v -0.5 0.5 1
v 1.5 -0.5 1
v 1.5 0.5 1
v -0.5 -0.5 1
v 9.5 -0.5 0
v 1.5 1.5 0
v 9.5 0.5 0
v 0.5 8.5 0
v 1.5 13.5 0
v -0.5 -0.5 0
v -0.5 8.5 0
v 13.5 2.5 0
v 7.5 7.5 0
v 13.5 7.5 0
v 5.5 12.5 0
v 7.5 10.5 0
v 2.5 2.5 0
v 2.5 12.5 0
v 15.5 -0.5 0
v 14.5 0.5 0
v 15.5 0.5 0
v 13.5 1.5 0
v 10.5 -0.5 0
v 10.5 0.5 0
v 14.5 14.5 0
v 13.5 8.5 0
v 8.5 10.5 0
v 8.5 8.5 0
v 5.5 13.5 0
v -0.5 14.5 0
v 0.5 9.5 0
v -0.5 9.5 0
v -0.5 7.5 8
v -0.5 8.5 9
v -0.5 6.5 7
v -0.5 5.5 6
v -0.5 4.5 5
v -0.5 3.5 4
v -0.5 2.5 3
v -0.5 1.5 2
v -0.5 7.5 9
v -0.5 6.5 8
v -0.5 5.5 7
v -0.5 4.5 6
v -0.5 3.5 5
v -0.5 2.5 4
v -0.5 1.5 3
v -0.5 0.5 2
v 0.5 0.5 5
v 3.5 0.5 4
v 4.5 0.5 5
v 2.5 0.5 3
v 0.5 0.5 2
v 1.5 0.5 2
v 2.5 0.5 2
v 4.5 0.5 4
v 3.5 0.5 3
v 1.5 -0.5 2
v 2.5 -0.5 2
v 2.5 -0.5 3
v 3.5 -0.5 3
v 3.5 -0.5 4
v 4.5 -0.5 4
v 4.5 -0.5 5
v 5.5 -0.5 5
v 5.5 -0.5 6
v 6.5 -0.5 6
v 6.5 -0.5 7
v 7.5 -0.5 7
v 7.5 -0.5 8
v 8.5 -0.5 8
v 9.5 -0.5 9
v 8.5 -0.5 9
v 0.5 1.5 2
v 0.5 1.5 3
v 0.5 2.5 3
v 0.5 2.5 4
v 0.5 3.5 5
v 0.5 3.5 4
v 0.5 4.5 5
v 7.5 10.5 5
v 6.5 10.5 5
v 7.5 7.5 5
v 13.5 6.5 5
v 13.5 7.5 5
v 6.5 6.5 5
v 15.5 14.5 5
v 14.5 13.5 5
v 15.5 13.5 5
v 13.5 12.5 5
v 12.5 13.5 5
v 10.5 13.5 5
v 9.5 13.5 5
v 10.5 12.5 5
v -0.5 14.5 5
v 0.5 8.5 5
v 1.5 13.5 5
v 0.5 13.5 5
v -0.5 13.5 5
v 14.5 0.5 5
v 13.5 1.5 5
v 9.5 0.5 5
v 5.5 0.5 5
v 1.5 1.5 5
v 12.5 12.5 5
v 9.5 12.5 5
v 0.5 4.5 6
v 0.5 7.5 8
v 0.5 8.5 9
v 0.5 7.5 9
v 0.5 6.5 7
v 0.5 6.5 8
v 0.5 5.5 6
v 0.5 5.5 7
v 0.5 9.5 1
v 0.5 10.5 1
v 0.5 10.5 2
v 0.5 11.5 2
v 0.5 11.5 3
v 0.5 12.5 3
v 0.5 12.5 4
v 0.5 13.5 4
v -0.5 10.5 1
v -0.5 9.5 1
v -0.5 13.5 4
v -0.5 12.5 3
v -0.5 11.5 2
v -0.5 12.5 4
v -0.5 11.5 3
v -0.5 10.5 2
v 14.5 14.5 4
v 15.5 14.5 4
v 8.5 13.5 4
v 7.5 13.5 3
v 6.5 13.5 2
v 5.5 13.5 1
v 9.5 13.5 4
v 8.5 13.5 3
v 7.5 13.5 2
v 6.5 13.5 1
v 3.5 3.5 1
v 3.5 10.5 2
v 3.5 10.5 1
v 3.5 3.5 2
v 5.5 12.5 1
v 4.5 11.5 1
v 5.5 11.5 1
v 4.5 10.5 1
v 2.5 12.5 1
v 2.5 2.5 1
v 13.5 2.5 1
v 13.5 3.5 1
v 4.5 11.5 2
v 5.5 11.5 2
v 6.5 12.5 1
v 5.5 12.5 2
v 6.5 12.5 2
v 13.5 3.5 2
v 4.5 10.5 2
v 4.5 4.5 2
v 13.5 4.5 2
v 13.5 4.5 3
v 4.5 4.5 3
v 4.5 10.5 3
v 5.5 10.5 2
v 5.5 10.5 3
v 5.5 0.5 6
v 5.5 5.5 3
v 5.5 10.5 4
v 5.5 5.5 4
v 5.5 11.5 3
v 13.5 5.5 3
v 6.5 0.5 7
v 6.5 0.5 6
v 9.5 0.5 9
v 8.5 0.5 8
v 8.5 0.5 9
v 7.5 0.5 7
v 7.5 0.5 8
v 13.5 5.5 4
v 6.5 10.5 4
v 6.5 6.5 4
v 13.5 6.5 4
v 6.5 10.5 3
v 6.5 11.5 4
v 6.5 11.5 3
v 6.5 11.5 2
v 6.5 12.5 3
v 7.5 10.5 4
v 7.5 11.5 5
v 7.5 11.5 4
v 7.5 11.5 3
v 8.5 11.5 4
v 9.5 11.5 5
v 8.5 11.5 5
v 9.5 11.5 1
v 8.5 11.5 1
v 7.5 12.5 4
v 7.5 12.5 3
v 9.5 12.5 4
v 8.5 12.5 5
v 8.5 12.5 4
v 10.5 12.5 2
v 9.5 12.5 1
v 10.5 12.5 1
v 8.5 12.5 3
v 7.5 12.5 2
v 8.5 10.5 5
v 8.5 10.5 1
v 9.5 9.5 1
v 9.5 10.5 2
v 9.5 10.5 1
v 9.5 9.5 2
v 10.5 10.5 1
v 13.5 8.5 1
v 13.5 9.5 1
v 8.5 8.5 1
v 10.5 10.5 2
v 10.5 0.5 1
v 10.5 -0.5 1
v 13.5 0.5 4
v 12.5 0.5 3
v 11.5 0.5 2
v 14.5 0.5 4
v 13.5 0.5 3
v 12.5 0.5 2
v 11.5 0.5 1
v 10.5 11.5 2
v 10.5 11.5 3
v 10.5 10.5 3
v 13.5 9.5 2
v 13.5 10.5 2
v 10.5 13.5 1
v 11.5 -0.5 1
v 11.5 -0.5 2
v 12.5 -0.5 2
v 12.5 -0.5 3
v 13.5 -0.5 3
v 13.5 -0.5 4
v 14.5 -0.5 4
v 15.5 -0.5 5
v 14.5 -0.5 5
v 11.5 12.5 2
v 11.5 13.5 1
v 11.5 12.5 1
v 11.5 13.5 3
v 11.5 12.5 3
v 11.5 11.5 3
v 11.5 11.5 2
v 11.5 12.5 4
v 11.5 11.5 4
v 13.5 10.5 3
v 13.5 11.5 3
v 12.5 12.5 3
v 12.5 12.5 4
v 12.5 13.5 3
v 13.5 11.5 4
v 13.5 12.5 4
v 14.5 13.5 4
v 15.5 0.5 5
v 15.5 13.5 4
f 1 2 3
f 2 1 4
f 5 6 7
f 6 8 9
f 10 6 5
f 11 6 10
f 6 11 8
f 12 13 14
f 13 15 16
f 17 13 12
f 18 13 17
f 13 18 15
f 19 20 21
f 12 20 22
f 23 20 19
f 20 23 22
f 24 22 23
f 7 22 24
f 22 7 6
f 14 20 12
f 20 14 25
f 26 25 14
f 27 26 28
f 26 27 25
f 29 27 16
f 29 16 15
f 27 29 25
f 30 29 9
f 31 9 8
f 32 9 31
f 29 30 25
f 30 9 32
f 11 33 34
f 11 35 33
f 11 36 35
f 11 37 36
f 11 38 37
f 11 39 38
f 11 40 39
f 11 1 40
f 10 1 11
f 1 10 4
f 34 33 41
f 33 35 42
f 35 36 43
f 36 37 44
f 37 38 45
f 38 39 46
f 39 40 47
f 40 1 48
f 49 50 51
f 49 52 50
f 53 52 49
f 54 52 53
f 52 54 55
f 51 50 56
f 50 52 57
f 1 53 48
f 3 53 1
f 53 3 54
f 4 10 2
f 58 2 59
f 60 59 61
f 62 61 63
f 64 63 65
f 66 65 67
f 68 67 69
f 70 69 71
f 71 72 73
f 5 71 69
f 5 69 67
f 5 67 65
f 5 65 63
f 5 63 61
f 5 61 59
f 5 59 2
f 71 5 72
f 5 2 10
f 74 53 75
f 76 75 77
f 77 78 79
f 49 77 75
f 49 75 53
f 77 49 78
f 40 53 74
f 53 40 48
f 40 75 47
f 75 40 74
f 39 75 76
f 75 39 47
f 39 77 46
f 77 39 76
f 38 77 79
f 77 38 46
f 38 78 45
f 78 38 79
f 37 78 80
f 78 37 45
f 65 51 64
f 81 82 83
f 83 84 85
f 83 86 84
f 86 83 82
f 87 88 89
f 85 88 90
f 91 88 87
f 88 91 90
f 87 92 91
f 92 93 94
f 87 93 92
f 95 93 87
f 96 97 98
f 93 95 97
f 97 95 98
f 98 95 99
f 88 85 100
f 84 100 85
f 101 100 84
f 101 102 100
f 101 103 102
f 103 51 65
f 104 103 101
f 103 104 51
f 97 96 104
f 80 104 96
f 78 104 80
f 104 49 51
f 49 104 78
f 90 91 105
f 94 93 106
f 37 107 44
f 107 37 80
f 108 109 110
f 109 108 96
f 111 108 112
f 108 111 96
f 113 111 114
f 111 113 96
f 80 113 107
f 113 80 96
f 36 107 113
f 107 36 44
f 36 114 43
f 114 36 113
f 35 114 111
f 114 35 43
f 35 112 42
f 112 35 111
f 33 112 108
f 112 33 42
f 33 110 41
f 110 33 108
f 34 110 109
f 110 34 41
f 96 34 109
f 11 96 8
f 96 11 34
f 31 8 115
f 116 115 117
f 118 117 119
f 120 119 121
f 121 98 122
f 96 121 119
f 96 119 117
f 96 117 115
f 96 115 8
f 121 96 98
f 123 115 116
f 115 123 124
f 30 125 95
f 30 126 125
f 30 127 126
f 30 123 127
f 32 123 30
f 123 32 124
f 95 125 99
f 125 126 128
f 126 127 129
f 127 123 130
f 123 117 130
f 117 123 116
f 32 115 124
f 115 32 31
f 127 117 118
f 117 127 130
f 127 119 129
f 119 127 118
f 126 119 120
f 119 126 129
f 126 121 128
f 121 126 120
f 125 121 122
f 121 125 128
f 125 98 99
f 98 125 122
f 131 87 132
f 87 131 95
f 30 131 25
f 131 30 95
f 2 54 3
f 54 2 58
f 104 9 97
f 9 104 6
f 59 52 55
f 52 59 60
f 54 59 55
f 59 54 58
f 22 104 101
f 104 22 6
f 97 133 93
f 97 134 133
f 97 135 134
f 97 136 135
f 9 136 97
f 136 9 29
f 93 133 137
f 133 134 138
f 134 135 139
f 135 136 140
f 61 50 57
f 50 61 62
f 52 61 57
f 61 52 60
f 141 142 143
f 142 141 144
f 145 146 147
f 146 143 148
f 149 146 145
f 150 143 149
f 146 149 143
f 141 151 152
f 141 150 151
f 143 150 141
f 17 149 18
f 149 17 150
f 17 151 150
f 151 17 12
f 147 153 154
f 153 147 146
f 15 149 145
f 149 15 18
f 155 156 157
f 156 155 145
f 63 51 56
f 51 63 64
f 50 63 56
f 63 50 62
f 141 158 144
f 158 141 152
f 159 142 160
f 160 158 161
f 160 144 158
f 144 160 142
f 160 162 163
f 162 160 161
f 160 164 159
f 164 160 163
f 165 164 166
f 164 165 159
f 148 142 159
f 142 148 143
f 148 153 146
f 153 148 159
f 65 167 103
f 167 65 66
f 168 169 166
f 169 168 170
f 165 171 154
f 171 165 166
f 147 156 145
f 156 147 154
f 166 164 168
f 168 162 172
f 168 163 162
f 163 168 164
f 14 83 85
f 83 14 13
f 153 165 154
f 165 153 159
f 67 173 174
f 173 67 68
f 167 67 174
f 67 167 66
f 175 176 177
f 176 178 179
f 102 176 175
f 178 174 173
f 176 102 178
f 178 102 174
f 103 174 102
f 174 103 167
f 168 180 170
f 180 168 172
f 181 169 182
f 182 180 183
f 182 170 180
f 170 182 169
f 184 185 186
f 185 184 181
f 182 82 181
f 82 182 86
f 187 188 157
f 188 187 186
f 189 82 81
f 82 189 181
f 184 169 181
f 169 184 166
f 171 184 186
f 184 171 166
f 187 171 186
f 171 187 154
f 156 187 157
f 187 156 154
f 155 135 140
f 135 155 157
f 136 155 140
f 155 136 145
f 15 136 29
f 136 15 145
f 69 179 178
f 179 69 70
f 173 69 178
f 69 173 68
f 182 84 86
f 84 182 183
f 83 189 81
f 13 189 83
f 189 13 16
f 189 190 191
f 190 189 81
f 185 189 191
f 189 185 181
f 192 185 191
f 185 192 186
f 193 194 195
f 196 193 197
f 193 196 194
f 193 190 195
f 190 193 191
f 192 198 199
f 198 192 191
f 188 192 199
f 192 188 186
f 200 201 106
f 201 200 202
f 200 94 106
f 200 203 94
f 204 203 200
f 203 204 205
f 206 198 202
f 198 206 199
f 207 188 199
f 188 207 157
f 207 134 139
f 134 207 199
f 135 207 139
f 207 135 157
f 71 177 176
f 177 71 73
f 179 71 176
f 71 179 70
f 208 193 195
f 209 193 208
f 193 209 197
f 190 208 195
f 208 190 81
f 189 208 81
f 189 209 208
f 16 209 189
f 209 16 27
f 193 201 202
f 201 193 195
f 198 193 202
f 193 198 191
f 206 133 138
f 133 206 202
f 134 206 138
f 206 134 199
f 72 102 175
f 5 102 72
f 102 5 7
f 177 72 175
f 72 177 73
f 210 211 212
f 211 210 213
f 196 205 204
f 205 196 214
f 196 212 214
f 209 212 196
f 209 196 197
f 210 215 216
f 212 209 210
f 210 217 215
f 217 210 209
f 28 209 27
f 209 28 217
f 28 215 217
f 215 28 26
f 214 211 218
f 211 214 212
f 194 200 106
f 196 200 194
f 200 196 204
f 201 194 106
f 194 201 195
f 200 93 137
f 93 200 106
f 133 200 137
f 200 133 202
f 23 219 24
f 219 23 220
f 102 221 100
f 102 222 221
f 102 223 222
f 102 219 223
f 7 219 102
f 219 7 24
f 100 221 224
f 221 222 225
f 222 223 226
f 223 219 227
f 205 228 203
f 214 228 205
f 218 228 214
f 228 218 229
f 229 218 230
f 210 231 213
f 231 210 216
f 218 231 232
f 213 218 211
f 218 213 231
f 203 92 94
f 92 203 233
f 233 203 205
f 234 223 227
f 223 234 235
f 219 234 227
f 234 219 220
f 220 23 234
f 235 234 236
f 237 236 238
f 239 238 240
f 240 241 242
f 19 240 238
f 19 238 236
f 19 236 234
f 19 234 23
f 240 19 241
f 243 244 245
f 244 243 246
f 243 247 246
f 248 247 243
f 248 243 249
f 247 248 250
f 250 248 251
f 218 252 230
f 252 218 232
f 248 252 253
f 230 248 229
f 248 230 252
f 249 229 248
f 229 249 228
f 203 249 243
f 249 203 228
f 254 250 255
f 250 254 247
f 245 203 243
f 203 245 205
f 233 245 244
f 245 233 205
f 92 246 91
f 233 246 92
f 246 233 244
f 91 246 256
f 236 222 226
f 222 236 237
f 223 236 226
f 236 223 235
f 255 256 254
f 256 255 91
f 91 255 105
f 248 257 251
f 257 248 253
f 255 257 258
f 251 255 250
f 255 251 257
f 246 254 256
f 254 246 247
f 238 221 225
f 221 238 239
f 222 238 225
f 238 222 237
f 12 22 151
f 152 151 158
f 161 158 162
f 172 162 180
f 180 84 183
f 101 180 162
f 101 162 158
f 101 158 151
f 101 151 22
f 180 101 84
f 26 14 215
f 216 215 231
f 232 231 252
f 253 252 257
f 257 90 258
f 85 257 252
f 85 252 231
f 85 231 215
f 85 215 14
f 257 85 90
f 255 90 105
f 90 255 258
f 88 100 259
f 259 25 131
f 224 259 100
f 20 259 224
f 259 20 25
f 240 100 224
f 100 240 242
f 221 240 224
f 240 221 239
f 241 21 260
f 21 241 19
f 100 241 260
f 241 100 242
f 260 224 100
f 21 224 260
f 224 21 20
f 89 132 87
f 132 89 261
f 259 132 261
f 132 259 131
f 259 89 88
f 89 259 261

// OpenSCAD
union() {
    translate([0, 0, 0.5]) cube([1, 1, 1], center=true);
    translate([0, 1, 1.0]) cube([1, 1, 2], center=true);
    translate([0, 2, 1.5]) cube([1, 1, 3], center=true);
    translate([0, 3, 2.0]) cube([1, 1, 4], center=true);
    translate([0, 4, 2.5]) cube([1, 1, 5], center=true);
    translate([0, 5, 3.0]) cube([1, 1, 6], center=true);
    translate([0, 6, 3.5]) cube([1, 1, 7], center=true);
    translate([0, 7, 4.0]) cube([1, 1, 8], center=true);
    translate([0, 8, 4.5]) cube([1, 1, 9], center=true);
    translate([0, 10, 0.5]) cube([1, 1, 1], center=true);
    translate([0, 11, 1.0]) cube([1, 1, 2], center=true);
    translate([0, 12, 1.5]) cube([1, 1, 3], center=true);
    translate([0, 13, 2.0]) cube([1, 1, 4], center=true);
    translate([0, 14, 2.5]) cube([1, 1, 5], center=true);
    translate([1, 0, 0.5]) cube([1, 1, 1], center=true);
    translate([1, 1, 2.5]) cube([1, 1, 5], center=true);
    translate([1, 2, 2.5]) cube([1, 1, 5], center=true);
    translate([1, 3, 2.5]) cube([1, 1, 5], center=true);
    translate([1, 4, 2.5]) cube([1, 1, 5], center=true);
    translate([1, 5, 2.5]) cube([1, 1, 5], center=true);
    translate([1, 6, 2.5]) cube([1, 1, 5], center=true);
    translate([1, 7, 2.5]) cube([1, 1, 5], center=true);
    translate([1, 8, 2.5]) cube([1, 1, 5], center=true);
    translate([1, 9, 2.5]) cube([1, 1, 5], center=true);
    translate([1, 10, 2.5]) cube([1, 1, 5], center=true);
    translate([1, 11, 2.5]) cube([1, 1, 5], center=true);
    translate([1, 12, 2.5]) cube([1, 1, 5], center=true);
    translate([1, 13, 2.5]) cube([1, 1, 5], center=true);
    translate([1, 14, 2.5]) cube([1, 1, 5], center=true);
    translate([2, 0, 1.0]) cube([1, 1, 2], center=true);
    translate([2, 1, 2.5]) cube([1, 1, 5], center=true);
    translate([2, 14, 2.5]) cube([1, 1, 5], center=true);
    translate([3, 0, 1.5]) cube([1, 1, 3], center=true);
    translate([3, 1, 2.5]) cube([1, 1, 5], center=true);
    translate([3, 3, 0.5]) cube([1, 1, 1], center=true);
    translate([3, 4, 0.5]) cube([1, 1, 1], center=true);
    translate([3, 5, 0.5]) cube([1, 1, 1], center=true);
    translate([3, 6, 0.5]) cube([1, 1, 1], center=true);
    translate([3, 7, 0.5]) cube([1, 1, 1], center=true);
    translate([3, 8, 0.5]) cube([1, 1, 1], center=true);
    translate([3, 9, 0.5]) cube([1, 1, 1], center=true);
    translate([3, 10, 0.5]) cube([1, 1, 1], center=true);
    translate([3, 11, 0.5]) cube([1, 1, 1], center=true);
    translate([3, 12, 0.5]) cube([1, 1, 1], center=true);
    translate([3, 14, 2.5]) cube([1, 1, 5], center=true);
    translate([4, 0, 2.0]) cube([1, 1, 4], center=true);
    translate([4, 1, 2.5]) cube([1, 1, 5], center=true);
    translate([4, 3, 0.5]) cube([1, 1, 1], center=true);
    translate([4, 4, 1.0]) cube([1, 1, 2], center=true);
    translate([4, 5, 1.0]) cube([1, 1, 2], center=true);
    translate([4, 6, 1.0]) cube([1, 1, 2], center=true);
    translate([4, 7, 1.0]) cube([1, 1, 2], center=true);
    translate([4, 8, 1.0]) cube([1, 1, 2], center=true);
    translate([4, 9, 1.0]) cube([1, 1, 2], center=true);
    translate([4, 10, 1.0]) cube([1, 1, 2], center=true);
    translate([4, 11, 0.5]) cube([1, 1, 1], center=true);
    translate([4, 12, 0.5]) cube([1, 1, 1], center=true);
    translate([4, 14, 2.5]) cube([1, 1, 5], center=true);
    translate([5, 0, 2.5]) cube([1, 1, 5], center=true);
    translate([5, 1, 2.5]) cube([1, 1, 5], center=true);
    translate([5, 3, 0.5]) cube([1, 1, 1], center=true);
    translate([5, 4, 1.0]) cube([1, 1, 2], center=true);
    translate([5, 5, 1.5]) cube([1, 1, 3], center=true);
    translate([5, 6, 1.5]) cube([1, 1, 3], center=true);
    translate([5, 7, 1.5]) cube([1, 1, 3], center=true);
    translate([5, 8, 1.5]) cube([1, 1, 3], center=true);
    translate([5, 9, 1.5]) cube([1, 1, 3], center=true);
    translate([5, 10, 1.5]) cube([1, 1, 3], center=true);
    translate([5, 11, 1.0]) cube([1, 1, 2], center=true);
    translate([5, 12, 0.5]) cube([1, 1, 1], center=true);
    translate([5, 14, 2.5]) cube([1, 1, 5], center=true);
    translate([6, 0, 3.0]) cube([1, 1, 6], center=true);
    translate([6, 1, 2.5]) cube([1, 1, 5], center=true);
    translate([6, 3, 0.5]) cube([1, 1, 1], center=true);
    translate([6, 4, 1.0]) cube([1, 1, 2], center=true);
    translate([6, 5, 1.5]) cube([1, 1, 3], center=true);
    translate([6, 6, 2.0]) cube([1, 1, 4], center=true);
    translate([6, 7, 2.0]) cube([1, 1, 4], center=true);
    translate([6, 8, 2.0]) cube([1, 1, 4], center=true);
    translate([6, 9, 2.0]) cube([1, 1, 4], center=true);
    translate([6, 10, 2.0]) cube([1, 1, 4], center=true);
    translate([6, 11, 1.5]) cube([1, 1, 3], center=true);
    translate([6, 12, 1.0]) cube([1, 1, 2], center=true);
    translate([6, 13, 0.5]) cube([1, 1, 1], center=true);
    translate([6, 14, 2.5]) cube([1, 1, 5], center=true);
    translate([7, 0, 3.5]) cube([1, 1, 7], center=true);
    translate([7, 1, 2.5]) cube([1, 1, 5], center=true);
    translate([7, 3, 0.5]) cube([1, 1, 1], center=true);
    translate([7, 4, 1.0]) cube([1, 1, 2], center=true);
    translate([7, 5, 1.5]) cube([1, 1, 3], center=true);
    translate([7, 6, 2.0]) cube([1, 1, 4], center=true);
    translate([7, 7, 2.5]) cube([1, 1, 5], center=true);
    translate([7, 8, 2.5]) cube([1, 1, 5], center=true);
    translate([7, 9, 2.5]) cube([1, 1, 5], center=true);
    translate([7, 10, 2.5]) cube([1, 1, 5], center=true);
    translate([7, 11, 2.0]) cube([1, 1, 4], center=true);
    translate([7, 12, 1.5]) cube([1, 1, 3], center=true);
    translate([7, 13, 1.0]) cube([1, 1, 2], center=true);
    translate([7, 14, 2.5]) cube([1, 1, 5], center=true);
    translate([8, 0, 4.0]) cube([1, 1, 8], center=true);
    translate([8, 1, 2.5]) cube([1, 1, 5], center=true);
    translate([8, 3, 0.5]) cube([1, 1, 1], center=true);
    translate([8, 4, 1.0]) cube([1, 1, 2], center=true);
    translate([8, 5, 1.5]) cube([1, 1, 3], center=true);
    translate([8, 6, 2.0]) cube([1, 1, 4], center=true);
    translate([8, 7, 2.5]) cube([1, 1, 5], center=true);
    translate([8, 11, 2.5]) cube([1, 1, 5], center=true);
    translate([8, 12, 2.0]) cube([1, 1, 4], center=true);
    translate([8, 13, 1.5]) cube([1, 1, 3], center=true);
    translate([8, 14, 2.5]) cube([1, 1, 5], center=true);
    translate([9, 0, 4.5]) cube([1, 1, 9], center=true);
    translate([9, 1, 2.5]) cube([1, 1, 5], center=true);
    translate([9, 3, 0.5]) cube([1, 1, 1], center=true);
    translate([9, 4, 1.0]) cube([1, 1, 2], center=true);
    translate([9, 5, 1.5]) cube([1, 1, 3], center=true);
    translate([9, 6, 2.0]) cube([1, 1, 4], center=true);
    translate([9, 7, 2.5]) cube([1, 1, 5], center=true);
    translate([9, 9, 0.5]) cube([1, 1, 1], center=true);
    translate([9, 10, 0.5]) cube([1, 1, 1], center=true);
    translate([9, 11, 0.5]) cube([1, 1, 1], center=true);
    translate([9, 12, 2.5]) cube([1, 1, 5], center=true);
    translate([9, 13, 2.0]) cube([1, 1, 4], center=true);
    translate([9, 14, 2.5]) cube([1, 1, 5], center=true);
    translate([10, 1, 2.5]) cube([1, 1, 5], center=true);
    translate([10, 3, 0.5]) cube([1, 1, 1], center=true);
    translate([10, 4, 1.0]) cube([1, 1, 2], center=true);
    translate([10, 5, 1.5]) cube([1, 1, 3], center=true);
    translate([10, 6, 2.0]) cube([1, 1, 4], center=true);
    translate([10, 7, 2.5]) cube([1, 1, 5], center=true);
    translate([10, 9, 0.5]) cube([1, 1, 1], center=true);
    translate([10, 10, 1.0]) cube([1, 1, 2], center=true);
    translate([10, 11, 0.5]) cube([1, 1, 1], center=true);
    translate([10, 12, 0.5]) cube([1, 1, 1], center=true);
    translate([10, 13, 2.5]) cube([1, 1, 5], center=true);
    translate([10, 14, 2.5]) cube([1, 1, 5], center=true);
    translate([11, 0, 0.5]) cube([1, 1, 1], center=true);
    translate([11, 1, 2.5]) cube([1, 1, 5], center=true);
    translate([11, 3, 0.5]) cube([1, 1, 1], center=true);
    translate([11, 4, 1.0]) cube([1, 1, 2], center=true);
    translate([11, 5, 1.5]) cube([1, 1, 3], center=true);
    translate([11, 6, 2.0]) cube([1, 1, 4], center=true);
    translate([11, 7, 2.5]) cube([1, 1, 5], center=true);
    translate([11, 9, 0.5]) cube([1, 1, 1], center=true);
    translate([11, 10, 1.0]) cube([1, 1, 2], center=true);
    translate([11, 11, 1.5]) cube([1, 1, 3], center=true);
    translate([11, 12, 1.0]) cube([1, 1, 2], center=true);
    translate([11, 13, 0.5]) cube([1, 1, 1], center=true);
    translate([11, 14, 2.5]) cube([1, 1, 5], center=true);
    translate([12, 0, 1.0]) cube([1, 1, 2], center=true);
    translate([12, 1, 2.5]) cube([1, 1, 5], center=true);
    translate([12, 3, 0.5]) cube([1, 1, 1], center=true);
    translate([12, 4, 1.0]) cube([1, 1, 2], center=true);
    translate([12, 5, 1.5]) cube([1, 1, 3], center=true);
    translate([12, 6, 2.0]) cube([1, 1, 4], center=true);
    translate([12, 7, 2.5]) cube([1, 1, 5], center=true);
    translate([12, 9, 0.5]) cube([1, 1, 1], center=true);
    translate([12, 10, 1.0]) cube([1, 1, 2], center=true);
    translate([12, 11, 1.5]) cube([1, 1, 3], center=true);
    translate([12, 12, 2.0]) cube([1, 1, 4], center=true);
    translate([12, 13, 1.5]) cube([1, 1, 3], center=true);
    translate([12, 14, 2.5]) cube([1, 1, 5], center=true);
    translate([13, 0, 1.5]) cube([1, 1, 3], center=true);
    translate([13, 1, 2.5]) cube([1, 1, 5], center=true);
    translate([13, 3, 0.5]) cube([1, 1, 1], center=true);
    translate([13, 4, 1.0]) cube([1, 1, 2], center=true);
    translate([13, 5, 1.5]) cube([1, 1, 3], center=true);
    translate([13, 6, 2.0]) cube([1, 1, 4], center=true);
    translate([13, 7, 2.5]) cube([1, 1, 5], center=true);
    translate([13, 9, 0.5]) cube([1, 1, 1], center=true);
    translate([13, 10, 1.0]) cube([1, 1, 2], center=true);
    translate([13, 11, 1.5]) cube([1, 1, 3], center=true);
    translate([13, 12, 2.0]) cube([1, 1, 4], center=true);
    translate([13, 13, 2.5]) cube([1, 1, 5], center=true);
    translate([13, 14, 2.5]) cube([1, 1, 5], center=true);
    translate([14, 0, 2.0]) cube([1, 1, 4], center=true);
    translate([14, 1, 2.5]) cube([1, 1, 5], center=true);
    translate([14, 2, 2.5]) cube([1, 1, 5], center=true);
    translate([14, 3, 2.5]) cube([1, 1, 5], center=true);
    translate([14, 4, 2.5]) cube([1, 1, 5], center=true);
    translate([14, 5, 2.5]) cube([1, 1, 5], center=true);
    translate([14, 6, 2.5]) cube([1, 1, 5], center=true);
    translate([14, 7, 2.5]) cube([1, 1, 5], center=true);
    translate([14, 8, 2.5]) cube([1, 1, 5], center=true);
    translate([14, 9, 2.5]) cube([1, 1, 5], center=true);
    translate([14, 10, 2.5]) cube([1, 1, 5], center=true);
    translate([14, 11, 2.5]) cube([1, 1, 5], center=true);
    translate([14, 12, 2.5]) cube([1, 1, 5], center=true);
    translate([14, 13, 2.5]) cube([1, 1, 5], center=true);
    translate([14, 14, 2.5]) cube([1, 1, 5], center=true);
    translate([15, 0, 2.5]) cube([1, 1, 5], center=true);
    translate([15, 14, 4.5]) color([0, 0, 1]) cube([1, 1, 1], center=true);
}
